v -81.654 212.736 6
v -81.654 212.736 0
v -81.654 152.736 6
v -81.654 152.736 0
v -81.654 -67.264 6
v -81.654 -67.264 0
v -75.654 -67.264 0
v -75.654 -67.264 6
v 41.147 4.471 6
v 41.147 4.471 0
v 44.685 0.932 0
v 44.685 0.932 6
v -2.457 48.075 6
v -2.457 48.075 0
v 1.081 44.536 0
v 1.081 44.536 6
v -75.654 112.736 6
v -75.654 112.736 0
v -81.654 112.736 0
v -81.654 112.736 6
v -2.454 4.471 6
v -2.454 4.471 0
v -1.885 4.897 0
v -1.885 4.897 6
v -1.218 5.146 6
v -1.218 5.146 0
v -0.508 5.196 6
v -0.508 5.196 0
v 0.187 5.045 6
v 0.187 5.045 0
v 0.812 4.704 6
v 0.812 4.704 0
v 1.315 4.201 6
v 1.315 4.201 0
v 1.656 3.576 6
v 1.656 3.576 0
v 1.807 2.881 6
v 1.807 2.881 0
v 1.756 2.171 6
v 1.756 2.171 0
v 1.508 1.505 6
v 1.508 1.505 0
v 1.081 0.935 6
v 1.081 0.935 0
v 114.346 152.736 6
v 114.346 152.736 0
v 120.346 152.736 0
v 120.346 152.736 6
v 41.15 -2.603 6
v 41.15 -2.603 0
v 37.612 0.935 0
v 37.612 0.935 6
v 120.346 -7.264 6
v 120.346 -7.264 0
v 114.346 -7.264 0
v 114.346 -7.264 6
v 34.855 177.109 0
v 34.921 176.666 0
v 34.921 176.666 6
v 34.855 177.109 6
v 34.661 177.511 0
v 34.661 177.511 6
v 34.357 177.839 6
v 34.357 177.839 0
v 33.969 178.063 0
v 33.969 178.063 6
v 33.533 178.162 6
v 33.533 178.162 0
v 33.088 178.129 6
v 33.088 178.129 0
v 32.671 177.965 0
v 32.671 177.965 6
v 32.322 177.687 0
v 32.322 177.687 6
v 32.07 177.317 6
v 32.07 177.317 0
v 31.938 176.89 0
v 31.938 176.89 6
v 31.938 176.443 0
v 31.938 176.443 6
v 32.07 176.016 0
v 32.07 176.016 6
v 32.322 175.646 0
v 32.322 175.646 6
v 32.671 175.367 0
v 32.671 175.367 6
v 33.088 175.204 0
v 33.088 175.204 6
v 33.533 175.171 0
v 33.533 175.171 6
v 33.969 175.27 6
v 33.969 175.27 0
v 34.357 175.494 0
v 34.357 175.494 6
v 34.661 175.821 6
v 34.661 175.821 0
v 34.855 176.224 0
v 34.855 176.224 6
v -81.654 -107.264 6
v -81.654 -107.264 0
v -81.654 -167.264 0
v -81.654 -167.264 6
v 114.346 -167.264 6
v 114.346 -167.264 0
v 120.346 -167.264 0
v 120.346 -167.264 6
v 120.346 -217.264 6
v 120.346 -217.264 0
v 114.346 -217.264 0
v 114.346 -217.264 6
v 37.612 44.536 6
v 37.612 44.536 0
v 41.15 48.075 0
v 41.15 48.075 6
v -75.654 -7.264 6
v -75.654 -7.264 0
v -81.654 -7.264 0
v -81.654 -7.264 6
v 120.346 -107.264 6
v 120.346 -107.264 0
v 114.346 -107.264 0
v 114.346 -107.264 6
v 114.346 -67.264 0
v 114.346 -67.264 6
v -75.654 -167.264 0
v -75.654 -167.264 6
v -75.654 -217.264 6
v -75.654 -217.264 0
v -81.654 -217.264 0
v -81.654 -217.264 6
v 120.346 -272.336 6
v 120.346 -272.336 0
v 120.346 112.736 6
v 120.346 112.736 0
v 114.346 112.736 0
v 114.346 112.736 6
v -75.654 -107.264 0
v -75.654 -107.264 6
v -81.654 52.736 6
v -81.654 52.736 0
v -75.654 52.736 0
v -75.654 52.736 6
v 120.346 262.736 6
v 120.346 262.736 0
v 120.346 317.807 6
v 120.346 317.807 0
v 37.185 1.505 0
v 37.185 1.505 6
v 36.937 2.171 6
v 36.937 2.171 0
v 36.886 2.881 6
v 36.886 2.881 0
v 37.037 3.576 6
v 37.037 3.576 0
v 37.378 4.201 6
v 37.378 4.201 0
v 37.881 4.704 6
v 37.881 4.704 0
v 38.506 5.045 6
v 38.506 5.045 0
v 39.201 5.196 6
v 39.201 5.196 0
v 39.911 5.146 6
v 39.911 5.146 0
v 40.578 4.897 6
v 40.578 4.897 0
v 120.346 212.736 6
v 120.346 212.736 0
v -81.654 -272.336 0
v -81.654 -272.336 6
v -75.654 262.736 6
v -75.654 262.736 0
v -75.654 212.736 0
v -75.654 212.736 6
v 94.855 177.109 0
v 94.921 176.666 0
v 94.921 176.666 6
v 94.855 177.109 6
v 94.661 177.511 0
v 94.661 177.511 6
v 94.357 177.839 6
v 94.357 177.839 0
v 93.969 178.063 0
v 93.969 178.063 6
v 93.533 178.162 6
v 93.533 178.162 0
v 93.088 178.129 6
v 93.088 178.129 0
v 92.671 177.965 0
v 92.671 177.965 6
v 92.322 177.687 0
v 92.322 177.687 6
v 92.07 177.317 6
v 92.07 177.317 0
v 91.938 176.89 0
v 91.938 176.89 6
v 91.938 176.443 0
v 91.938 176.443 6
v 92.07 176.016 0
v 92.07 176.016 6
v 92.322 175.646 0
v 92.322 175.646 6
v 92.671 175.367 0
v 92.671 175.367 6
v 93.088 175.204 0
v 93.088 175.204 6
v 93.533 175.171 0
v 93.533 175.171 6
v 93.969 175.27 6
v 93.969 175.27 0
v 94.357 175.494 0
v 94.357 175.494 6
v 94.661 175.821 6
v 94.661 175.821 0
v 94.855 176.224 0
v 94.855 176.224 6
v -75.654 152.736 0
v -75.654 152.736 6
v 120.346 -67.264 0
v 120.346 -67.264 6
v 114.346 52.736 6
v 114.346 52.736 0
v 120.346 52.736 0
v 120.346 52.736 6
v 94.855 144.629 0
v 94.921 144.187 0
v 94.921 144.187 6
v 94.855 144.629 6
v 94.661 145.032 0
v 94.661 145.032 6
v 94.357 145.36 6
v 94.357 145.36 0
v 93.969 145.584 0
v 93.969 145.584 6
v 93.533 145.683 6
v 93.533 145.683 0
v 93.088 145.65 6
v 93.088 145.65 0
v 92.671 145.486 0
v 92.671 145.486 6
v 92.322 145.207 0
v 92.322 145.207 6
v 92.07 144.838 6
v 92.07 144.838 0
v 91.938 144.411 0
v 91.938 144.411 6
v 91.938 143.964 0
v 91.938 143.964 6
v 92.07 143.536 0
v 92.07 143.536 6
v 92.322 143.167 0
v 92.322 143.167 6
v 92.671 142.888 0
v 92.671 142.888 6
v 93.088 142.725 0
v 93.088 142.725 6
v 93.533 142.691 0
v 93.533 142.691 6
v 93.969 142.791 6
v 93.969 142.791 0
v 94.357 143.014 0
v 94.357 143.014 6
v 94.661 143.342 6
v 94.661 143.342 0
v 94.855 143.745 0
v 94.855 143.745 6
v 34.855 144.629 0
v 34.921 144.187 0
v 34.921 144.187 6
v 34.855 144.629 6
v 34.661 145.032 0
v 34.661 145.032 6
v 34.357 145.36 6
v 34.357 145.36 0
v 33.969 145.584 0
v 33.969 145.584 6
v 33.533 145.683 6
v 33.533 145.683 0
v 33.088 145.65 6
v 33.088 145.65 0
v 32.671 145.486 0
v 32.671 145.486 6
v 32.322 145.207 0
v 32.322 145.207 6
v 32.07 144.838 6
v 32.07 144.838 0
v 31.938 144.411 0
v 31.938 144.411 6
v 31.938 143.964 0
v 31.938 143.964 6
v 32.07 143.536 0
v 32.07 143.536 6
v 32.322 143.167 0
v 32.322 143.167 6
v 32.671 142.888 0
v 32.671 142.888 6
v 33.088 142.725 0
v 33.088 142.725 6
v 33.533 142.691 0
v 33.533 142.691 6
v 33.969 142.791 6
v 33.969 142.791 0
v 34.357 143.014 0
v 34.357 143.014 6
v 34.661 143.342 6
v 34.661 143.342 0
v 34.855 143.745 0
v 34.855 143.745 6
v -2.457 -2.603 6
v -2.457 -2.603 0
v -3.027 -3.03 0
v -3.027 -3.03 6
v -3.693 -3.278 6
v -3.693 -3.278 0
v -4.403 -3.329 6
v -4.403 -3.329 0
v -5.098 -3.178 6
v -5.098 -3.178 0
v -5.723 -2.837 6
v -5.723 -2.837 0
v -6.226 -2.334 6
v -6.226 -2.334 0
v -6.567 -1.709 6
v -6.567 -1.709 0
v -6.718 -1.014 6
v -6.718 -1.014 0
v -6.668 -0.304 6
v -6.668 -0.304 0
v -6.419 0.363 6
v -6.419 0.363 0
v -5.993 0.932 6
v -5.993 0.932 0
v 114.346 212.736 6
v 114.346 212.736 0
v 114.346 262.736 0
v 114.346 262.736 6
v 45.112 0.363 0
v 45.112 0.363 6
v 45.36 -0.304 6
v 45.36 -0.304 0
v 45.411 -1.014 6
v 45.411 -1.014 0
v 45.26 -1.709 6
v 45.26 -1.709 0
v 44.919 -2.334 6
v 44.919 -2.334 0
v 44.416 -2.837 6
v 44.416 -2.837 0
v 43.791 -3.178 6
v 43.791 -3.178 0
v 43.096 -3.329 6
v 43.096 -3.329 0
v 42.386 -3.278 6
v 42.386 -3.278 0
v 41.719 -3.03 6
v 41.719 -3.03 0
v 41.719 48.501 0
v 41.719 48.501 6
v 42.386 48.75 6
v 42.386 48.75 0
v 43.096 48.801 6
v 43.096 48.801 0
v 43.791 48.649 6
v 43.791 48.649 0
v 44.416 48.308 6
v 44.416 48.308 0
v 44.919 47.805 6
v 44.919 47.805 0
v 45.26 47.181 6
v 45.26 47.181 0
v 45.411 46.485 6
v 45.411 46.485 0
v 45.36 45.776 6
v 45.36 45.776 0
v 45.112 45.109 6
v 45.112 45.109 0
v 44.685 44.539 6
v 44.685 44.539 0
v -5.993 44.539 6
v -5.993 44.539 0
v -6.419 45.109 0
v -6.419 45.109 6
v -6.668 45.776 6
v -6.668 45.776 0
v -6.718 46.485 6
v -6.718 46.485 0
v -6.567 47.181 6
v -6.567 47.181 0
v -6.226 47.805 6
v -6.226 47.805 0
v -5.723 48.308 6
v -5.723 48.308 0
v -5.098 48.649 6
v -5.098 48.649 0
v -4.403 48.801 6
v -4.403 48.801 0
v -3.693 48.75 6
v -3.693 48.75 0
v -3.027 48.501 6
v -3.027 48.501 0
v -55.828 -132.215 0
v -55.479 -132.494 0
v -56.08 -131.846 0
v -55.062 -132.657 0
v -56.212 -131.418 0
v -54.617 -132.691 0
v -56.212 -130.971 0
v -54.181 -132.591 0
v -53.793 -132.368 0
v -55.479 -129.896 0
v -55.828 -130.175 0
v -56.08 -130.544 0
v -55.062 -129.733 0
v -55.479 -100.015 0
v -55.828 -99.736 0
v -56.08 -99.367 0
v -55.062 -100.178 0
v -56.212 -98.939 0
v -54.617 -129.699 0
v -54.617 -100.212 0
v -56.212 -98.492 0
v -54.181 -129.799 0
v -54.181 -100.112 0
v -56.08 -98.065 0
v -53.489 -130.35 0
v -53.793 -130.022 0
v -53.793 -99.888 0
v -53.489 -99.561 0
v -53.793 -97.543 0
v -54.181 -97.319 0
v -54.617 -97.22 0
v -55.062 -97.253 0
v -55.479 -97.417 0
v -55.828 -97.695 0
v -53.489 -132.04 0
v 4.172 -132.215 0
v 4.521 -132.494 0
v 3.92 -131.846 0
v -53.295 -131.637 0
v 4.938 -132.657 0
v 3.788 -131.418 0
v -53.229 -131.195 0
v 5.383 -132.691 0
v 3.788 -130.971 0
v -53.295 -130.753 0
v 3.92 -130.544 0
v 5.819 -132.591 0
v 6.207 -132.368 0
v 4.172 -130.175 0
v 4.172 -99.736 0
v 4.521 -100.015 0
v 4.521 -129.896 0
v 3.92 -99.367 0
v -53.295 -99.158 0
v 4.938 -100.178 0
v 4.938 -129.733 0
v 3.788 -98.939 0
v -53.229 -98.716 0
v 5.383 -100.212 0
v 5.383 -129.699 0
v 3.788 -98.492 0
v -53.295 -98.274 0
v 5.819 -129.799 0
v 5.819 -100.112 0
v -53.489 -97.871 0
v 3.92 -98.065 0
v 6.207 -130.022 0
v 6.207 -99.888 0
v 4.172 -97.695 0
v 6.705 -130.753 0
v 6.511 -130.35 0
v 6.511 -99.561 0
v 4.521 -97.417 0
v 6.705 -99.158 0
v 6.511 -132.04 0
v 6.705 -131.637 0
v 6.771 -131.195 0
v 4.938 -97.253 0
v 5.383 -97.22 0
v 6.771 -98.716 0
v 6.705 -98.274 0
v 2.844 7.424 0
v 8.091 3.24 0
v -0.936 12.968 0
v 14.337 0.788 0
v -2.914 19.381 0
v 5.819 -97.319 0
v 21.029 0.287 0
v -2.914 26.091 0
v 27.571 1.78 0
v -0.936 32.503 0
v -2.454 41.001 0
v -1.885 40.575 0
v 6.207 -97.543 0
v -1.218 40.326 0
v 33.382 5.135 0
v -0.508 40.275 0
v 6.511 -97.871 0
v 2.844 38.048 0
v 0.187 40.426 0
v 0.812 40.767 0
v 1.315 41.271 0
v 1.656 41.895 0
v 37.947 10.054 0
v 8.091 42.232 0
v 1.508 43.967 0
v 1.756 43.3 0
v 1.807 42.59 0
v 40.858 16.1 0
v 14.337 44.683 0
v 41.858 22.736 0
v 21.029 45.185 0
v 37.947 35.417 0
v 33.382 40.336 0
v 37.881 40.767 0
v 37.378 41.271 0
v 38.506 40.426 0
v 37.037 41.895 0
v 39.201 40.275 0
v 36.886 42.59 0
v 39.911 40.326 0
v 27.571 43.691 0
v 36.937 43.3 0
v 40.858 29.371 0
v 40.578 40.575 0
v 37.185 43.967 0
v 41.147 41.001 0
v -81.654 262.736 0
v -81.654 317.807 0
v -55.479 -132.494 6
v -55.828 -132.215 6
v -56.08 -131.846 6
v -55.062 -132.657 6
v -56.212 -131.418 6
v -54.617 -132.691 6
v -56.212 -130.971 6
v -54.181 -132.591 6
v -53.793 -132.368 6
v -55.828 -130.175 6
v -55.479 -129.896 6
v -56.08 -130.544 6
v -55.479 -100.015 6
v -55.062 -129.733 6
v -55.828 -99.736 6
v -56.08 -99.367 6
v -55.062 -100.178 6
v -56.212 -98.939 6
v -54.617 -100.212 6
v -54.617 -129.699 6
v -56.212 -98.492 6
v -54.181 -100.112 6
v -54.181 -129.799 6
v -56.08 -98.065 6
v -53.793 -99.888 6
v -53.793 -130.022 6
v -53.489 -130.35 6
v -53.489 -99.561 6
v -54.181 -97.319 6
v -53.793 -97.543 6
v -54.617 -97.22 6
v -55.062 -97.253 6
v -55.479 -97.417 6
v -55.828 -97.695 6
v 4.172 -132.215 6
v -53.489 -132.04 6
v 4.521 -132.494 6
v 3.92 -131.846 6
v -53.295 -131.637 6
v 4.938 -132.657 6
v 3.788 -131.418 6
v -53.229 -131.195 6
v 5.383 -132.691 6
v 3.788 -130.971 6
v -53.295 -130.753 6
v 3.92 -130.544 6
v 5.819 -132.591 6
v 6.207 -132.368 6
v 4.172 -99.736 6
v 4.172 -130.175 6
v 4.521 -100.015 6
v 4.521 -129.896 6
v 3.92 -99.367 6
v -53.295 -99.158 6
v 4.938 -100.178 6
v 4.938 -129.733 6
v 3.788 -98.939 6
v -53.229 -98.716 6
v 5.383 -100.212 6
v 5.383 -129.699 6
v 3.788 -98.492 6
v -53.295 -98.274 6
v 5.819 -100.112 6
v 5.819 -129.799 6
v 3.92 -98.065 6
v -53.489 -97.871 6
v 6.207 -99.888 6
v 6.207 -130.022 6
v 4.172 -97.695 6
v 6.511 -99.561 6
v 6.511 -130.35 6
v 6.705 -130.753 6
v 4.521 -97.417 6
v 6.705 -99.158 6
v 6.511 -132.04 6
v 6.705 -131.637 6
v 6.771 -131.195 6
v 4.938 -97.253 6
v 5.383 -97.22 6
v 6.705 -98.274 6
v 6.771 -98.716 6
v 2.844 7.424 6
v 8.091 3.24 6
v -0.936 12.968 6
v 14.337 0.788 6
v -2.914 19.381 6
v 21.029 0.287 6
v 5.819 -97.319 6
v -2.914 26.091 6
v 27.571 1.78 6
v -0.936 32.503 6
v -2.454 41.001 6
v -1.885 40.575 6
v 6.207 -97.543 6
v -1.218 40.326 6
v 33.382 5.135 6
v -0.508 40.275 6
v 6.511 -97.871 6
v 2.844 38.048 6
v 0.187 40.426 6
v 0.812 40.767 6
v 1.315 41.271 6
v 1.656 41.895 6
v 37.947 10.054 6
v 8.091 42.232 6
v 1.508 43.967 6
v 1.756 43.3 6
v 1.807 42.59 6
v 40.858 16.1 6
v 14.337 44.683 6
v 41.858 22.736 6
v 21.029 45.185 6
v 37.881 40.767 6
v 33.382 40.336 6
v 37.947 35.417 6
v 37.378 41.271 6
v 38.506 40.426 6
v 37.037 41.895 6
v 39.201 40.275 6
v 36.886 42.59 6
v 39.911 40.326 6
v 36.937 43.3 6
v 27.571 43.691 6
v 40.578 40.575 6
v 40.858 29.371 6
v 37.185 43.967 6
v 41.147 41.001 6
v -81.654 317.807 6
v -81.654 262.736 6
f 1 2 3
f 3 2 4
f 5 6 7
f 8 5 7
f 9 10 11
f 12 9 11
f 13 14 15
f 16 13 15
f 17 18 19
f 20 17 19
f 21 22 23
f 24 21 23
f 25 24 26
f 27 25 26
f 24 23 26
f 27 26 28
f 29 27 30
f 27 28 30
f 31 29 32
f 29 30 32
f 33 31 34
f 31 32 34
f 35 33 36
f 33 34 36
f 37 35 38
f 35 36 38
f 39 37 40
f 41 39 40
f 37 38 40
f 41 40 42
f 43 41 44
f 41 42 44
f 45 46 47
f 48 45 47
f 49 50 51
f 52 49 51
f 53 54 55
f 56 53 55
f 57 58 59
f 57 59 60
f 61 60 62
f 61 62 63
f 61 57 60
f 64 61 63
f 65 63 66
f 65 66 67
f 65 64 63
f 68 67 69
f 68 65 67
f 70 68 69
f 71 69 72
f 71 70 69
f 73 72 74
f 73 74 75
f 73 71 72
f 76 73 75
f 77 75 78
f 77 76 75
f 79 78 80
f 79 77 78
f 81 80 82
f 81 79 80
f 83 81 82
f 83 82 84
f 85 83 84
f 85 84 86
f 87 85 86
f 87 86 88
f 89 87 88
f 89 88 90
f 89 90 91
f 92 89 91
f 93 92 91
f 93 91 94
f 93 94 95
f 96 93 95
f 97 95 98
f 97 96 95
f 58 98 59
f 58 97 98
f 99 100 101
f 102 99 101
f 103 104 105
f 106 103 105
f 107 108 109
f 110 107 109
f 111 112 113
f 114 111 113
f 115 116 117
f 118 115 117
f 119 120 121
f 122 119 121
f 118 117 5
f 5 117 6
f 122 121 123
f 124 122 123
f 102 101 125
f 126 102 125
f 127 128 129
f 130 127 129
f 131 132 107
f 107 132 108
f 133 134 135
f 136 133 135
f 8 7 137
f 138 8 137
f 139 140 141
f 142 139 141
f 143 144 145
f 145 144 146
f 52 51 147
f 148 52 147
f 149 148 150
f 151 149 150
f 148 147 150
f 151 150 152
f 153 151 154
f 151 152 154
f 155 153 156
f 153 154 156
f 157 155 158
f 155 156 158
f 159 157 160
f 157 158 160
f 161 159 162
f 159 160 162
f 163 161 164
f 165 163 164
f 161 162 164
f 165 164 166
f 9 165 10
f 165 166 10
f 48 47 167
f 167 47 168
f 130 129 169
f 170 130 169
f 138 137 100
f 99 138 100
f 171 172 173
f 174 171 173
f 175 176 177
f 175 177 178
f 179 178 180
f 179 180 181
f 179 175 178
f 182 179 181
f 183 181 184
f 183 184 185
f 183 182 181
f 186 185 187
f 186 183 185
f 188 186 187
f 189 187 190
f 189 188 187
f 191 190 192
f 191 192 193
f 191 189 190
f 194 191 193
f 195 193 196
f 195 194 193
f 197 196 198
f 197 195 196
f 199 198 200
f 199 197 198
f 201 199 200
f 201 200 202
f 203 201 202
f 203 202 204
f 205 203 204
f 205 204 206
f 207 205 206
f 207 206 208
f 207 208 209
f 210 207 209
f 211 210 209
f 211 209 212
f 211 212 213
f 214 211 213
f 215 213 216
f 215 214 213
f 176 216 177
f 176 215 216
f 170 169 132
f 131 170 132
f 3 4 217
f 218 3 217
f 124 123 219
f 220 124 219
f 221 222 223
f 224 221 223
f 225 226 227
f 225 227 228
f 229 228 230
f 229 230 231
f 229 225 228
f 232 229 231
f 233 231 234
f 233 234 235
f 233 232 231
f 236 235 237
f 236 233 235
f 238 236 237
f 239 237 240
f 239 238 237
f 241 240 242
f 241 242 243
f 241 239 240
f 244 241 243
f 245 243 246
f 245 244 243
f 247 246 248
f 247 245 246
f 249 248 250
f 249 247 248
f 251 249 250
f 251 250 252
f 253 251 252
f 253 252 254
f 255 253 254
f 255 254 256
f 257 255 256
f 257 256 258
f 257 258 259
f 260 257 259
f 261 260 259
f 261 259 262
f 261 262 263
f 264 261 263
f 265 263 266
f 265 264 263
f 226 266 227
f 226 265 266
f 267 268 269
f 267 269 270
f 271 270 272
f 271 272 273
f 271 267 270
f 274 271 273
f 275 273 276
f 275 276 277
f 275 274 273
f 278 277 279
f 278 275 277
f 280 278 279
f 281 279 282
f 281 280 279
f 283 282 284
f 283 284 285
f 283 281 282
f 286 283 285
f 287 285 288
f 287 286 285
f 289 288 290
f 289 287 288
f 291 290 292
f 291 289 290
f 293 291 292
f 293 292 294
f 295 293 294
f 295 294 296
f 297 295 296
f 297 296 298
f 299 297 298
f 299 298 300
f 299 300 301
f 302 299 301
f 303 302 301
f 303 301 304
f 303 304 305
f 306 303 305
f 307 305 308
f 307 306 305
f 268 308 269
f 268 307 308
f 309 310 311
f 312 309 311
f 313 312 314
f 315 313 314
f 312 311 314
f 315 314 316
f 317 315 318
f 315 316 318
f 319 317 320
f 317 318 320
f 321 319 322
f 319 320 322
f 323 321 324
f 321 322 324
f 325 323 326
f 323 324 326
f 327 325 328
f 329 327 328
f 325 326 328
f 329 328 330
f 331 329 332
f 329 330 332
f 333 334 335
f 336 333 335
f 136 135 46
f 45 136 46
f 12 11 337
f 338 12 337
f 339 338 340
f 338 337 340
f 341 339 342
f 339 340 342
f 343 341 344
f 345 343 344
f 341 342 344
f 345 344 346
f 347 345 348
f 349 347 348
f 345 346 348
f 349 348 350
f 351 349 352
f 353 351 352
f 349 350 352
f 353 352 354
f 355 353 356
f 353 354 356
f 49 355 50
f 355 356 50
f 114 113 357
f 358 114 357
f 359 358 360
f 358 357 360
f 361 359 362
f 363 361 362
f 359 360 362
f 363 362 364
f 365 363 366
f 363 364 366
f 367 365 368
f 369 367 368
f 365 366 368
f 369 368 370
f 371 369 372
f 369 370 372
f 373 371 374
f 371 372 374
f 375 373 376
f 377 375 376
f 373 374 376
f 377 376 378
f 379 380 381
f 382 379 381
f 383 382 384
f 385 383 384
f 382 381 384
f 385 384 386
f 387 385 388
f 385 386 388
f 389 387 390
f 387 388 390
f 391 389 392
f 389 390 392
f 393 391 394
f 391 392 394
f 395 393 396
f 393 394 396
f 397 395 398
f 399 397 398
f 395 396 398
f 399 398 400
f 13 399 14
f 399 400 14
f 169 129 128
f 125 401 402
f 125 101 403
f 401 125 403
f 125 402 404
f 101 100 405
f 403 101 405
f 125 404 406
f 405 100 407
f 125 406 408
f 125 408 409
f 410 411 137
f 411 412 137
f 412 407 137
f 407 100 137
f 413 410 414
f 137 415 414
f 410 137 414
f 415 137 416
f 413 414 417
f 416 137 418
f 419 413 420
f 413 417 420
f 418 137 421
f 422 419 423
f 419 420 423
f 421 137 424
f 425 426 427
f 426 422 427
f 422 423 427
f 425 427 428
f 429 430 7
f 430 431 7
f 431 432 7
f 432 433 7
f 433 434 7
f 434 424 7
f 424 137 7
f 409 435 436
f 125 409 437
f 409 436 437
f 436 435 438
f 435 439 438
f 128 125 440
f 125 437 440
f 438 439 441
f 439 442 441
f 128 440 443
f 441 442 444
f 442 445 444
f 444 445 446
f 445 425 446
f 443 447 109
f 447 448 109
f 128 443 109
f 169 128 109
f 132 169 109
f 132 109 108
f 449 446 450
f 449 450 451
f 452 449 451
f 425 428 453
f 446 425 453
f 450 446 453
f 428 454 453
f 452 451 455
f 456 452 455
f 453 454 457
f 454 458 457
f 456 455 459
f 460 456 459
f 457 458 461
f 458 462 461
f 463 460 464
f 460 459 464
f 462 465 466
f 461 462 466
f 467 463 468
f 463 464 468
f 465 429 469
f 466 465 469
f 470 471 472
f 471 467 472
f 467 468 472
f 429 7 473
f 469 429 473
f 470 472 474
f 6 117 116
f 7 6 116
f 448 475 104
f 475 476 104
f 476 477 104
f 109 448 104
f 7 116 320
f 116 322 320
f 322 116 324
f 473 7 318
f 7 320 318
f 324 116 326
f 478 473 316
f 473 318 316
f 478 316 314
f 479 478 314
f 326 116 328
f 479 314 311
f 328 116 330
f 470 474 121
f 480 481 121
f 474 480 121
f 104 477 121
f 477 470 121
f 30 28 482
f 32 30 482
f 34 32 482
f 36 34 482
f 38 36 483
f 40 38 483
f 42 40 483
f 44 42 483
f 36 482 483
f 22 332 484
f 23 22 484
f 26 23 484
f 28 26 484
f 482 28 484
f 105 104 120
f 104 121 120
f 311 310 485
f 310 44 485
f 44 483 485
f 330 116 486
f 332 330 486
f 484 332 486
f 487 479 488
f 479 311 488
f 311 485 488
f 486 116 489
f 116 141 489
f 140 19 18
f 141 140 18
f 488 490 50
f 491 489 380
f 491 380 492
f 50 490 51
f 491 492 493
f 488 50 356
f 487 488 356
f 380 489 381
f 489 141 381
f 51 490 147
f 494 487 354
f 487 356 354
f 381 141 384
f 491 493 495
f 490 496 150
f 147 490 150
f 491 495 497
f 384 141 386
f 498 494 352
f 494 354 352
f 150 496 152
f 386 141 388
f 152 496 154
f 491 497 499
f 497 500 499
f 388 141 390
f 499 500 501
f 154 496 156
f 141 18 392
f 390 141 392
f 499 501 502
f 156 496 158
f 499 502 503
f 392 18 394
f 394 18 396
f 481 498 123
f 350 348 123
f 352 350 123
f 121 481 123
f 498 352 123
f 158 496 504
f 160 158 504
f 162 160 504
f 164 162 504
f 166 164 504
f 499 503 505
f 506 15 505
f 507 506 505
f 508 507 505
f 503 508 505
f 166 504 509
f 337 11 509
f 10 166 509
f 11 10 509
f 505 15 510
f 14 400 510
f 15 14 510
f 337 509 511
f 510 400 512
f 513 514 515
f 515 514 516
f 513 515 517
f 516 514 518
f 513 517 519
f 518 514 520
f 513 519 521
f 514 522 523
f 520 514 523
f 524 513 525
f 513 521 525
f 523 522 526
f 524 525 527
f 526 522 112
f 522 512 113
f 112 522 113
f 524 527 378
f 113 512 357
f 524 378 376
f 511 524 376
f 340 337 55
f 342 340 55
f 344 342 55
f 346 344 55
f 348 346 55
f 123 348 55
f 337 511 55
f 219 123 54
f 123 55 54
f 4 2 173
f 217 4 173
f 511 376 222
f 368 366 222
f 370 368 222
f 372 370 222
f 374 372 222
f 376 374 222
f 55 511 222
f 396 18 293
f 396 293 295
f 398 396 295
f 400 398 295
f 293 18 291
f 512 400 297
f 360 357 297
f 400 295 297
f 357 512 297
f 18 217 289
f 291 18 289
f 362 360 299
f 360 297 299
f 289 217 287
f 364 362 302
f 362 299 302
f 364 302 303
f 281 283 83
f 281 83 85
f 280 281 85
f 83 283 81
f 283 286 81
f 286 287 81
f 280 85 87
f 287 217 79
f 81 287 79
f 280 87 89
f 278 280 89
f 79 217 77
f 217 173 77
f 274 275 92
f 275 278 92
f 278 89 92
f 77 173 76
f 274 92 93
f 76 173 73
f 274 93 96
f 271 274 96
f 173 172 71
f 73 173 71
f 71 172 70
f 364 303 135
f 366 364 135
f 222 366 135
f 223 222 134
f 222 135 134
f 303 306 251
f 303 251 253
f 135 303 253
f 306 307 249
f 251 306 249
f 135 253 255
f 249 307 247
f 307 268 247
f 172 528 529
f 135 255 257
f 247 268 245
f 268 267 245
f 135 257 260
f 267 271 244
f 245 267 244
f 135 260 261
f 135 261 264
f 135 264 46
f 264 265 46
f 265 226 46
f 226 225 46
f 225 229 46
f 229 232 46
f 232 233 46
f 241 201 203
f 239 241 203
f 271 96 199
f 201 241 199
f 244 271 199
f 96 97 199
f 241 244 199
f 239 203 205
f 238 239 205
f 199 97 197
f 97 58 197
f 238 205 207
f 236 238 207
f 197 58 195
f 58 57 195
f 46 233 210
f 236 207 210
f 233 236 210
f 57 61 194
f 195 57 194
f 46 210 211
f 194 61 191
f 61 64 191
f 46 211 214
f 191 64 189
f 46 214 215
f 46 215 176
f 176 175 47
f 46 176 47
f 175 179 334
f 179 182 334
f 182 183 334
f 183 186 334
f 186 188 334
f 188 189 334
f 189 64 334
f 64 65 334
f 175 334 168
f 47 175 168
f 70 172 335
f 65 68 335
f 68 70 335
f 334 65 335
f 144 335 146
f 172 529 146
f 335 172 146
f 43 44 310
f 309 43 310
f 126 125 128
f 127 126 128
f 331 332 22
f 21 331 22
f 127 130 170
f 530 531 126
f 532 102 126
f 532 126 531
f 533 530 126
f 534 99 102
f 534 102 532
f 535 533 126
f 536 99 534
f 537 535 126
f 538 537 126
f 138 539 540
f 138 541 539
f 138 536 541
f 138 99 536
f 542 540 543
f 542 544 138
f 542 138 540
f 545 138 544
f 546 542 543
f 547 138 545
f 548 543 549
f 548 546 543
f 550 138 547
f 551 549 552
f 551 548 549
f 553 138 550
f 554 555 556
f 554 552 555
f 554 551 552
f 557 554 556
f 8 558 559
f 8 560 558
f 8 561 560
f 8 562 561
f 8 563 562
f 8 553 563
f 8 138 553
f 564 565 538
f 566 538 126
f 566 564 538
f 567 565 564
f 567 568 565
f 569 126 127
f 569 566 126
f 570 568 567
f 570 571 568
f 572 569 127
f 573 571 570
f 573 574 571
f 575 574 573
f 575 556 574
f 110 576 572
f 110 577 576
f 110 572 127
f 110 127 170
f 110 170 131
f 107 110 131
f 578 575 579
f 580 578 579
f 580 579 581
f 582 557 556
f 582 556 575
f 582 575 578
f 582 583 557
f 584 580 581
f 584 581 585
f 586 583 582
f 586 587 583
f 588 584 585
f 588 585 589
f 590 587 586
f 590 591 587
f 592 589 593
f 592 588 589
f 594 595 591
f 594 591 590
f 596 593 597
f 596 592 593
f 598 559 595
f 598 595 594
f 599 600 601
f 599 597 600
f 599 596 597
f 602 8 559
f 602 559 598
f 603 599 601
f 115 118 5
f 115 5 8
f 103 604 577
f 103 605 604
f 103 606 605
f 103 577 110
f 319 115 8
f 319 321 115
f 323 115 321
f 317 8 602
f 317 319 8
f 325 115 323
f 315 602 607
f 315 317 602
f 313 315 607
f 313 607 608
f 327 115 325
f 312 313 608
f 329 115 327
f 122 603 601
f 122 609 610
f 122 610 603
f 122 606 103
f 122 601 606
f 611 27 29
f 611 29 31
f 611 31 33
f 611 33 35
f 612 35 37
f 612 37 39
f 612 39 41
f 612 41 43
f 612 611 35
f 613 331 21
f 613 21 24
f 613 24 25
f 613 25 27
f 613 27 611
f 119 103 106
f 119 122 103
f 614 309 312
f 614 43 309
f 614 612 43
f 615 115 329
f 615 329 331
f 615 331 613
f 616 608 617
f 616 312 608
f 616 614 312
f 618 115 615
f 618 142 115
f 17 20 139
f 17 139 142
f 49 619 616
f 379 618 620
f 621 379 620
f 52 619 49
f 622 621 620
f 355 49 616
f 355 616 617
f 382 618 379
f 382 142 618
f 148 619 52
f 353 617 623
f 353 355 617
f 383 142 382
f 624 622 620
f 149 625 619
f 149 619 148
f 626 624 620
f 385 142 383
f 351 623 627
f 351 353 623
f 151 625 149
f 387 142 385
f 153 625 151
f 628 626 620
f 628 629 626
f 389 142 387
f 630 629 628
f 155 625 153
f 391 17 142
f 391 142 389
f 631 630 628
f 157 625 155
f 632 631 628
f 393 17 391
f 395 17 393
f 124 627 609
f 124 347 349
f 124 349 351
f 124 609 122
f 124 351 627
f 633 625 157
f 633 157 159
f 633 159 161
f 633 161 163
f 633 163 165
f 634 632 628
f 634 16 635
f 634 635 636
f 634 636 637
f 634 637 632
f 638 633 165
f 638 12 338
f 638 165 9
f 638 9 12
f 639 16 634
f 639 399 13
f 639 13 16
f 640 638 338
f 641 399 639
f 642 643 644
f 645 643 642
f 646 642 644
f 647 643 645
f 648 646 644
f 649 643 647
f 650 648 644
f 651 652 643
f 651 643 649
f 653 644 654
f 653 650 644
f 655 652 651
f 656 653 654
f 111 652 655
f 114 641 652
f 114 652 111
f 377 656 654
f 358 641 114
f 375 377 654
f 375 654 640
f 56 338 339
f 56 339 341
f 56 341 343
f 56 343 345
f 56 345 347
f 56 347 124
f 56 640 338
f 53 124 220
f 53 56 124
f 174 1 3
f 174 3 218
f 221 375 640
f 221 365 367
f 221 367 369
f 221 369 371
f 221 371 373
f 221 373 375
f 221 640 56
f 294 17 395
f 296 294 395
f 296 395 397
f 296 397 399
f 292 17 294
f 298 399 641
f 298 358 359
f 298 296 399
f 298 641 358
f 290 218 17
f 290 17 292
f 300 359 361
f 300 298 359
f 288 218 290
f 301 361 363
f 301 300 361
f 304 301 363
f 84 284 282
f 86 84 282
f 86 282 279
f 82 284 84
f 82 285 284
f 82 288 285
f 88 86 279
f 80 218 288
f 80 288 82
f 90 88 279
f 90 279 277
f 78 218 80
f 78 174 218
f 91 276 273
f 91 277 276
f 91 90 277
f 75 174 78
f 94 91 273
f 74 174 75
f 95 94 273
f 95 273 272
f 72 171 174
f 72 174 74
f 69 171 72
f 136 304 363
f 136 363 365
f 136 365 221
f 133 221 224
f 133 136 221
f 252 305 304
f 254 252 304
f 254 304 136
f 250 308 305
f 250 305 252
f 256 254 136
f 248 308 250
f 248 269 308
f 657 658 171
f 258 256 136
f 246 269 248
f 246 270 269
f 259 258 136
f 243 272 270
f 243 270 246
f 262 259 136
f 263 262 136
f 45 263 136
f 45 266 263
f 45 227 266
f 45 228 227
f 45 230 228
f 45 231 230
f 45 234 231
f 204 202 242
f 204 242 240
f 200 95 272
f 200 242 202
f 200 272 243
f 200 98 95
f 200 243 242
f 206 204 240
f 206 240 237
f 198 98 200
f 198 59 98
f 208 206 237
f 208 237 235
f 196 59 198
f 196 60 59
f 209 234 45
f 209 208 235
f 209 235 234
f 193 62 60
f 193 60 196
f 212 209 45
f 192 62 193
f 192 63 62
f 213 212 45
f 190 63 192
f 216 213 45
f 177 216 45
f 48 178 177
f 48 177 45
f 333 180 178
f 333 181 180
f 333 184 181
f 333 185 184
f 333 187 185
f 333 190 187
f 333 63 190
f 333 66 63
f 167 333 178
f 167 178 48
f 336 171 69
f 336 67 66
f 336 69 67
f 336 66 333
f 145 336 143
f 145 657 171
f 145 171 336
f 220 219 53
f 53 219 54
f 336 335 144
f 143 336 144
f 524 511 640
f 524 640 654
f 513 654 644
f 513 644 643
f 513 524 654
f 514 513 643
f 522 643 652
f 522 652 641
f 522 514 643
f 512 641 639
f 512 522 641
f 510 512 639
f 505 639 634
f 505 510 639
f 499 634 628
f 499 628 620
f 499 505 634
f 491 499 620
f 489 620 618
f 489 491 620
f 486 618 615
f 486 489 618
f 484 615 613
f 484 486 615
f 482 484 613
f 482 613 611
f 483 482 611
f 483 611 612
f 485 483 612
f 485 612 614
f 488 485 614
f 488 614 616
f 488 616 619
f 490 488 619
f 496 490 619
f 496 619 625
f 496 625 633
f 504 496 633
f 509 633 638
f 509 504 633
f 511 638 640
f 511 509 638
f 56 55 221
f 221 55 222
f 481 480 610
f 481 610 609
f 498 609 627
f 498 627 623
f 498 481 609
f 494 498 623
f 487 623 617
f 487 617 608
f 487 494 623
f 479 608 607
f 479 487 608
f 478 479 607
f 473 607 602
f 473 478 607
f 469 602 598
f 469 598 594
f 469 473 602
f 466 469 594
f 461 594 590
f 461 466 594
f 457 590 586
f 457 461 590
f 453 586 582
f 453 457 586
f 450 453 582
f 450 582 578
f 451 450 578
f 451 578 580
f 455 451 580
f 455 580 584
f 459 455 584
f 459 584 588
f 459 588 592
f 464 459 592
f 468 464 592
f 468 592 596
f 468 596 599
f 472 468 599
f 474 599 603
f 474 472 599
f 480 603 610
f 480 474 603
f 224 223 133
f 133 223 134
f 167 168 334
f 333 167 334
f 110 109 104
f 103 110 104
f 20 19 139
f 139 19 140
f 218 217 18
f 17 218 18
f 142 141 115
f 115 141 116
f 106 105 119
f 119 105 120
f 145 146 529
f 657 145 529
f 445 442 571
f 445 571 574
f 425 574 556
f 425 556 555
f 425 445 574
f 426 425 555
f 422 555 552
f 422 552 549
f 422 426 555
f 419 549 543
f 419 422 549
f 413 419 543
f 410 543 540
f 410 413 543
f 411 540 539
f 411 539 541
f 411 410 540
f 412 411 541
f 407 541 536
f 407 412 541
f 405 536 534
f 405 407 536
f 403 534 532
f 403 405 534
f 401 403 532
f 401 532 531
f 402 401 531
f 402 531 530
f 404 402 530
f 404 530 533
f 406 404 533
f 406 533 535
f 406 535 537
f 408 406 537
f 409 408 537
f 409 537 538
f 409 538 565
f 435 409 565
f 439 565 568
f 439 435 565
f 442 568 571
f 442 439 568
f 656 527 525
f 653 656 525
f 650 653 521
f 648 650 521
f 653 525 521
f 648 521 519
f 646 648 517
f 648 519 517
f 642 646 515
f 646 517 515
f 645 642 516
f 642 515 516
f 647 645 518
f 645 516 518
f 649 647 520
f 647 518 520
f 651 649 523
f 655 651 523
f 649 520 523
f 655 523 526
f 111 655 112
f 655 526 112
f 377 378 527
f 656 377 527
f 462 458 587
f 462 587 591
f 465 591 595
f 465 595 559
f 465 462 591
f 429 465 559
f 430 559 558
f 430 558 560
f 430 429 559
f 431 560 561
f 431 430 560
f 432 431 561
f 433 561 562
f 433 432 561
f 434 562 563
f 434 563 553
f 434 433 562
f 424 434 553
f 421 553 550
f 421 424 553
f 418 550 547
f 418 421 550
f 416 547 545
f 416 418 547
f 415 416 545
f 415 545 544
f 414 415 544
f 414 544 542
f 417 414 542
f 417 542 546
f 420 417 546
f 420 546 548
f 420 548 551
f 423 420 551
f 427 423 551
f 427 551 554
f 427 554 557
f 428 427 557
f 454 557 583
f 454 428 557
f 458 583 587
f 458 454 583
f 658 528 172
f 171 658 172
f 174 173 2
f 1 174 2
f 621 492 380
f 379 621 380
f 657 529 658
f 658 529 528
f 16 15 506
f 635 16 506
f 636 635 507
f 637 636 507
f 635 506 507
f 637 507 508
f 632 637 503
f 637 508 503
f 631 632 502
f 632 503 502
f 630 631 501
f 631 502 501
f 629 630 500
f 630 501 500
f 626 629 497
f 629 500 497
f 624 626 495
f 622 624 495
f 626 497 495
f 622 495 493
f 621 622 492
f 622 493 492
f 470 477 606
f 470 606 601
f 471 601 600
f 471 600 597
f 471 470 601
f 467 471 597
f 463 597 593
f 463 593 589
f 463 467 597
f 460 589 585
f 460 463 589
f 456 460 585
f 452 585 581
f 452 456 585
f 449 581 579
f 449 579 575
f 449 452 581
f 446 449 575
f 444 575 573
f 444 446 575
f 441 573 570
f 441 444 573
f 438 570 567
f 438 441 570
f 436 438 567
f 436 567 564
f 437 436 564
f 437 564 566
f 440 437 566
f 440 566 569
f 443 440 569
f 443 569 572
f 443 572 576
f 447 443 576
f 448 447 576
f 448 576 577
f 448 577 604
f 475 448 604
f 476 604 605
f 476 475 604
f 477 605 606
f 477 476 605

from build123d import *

# Parameters (mm, degrees)
SKETCH1_R           = 1.5
SKETCH1_R_2         = 22.511799613
BOSS_EXTRUDE1_DEPTH = 6


with BuildPart() as part:
    # Sketch1 → Boss-Extrude1 (new body)
    with BuildSketch(Plane.XY):
        Polygon((114.346400169, -107.26425955), (114.346400169, -67.26425955), (120.346400169, -67.26425955), (120.346400169, -7.26425955), (114.346400169, -7.26425955), (114.346400169, 52.73574045), (120.346400169, 52.73574045), (120.346400169, 112.73574045), (114.346400169, 112.73574045), (114.346400169, 152.73574045), (120.346400169, 152.73574045), (120.346400169, 212.73574045), (114.346400169, 212.73574045), (114.346400169, 262.73574045), (120.346400169, 262.73574045), (120.346400169, 317.807433635), (-81.653599831, 317.807433635), (-81.653599831, 262.73574045), (-75.653599831, 262.73574045), (-75.653599831, 212.73574045), (-81.653599831, 212.73574045), (-81.653599831, 152.73574045), (-75.653599831, 152.73574045), (-75.653599831, 112.73574045), (-81.653599831, 112.73574045), (-81.653599831, 52.73574045), (-75.653599831, 52.73574045), (-75.653599831, -7.26425955), (-81.653599831, -7.26425955), (-81.653599831, -67.26425955), (-75.653599831, -67.26425955), (-75.653599831, -107.26425955), (-81.653599831, -107.26425955), (-81.653599831, -167.26425955), (-75.653599831, -167.26425955), (-75.653599831, -217.26425955), (-81.653599831, -217.26425955), (-81.653599831, -272.335952735), (120.346400169, -272.335952735), (120.346400169, -217.26425955), (114.346400169, -217.26425955), (114.346400169, -167.26425955), (120.346400169, -167.26425955), (120.346400169, -107.26425955), align=None)
        with Locations((93.421400169, 144.187215683)):
            Circle(SKETCH1_R, mode=Mode.SUBTRACT)
        with Locations((93.421400169, 176.66641252)):
            Circle(SKETCH1_R, mode=Mode.SUBTRACT)
        with Locations((33.421400169, 144.187215683)):
            Circle(SKETCH1_R, mode=Mode.SUBTRACT)
        with Locations((-54.728599831, -131.19493162)):
            Circle(SKETCH1_R, mode=Mode.SUBTRACT)
        with Locations((33.421400169, 176.66641252)):
            Circle(SKETCH1_R, mode=Mode.SUBTRACT)
        with Locations((-54.728599831, -98.715734783)):
            Circle(SKETCH1_R, mode=Mode.SUBTRACT)
        with Locations((5.271400169, -98.715734783)):
            Circle(SKETCH1_R, mode=Mode.SUBTRACT)
        with Locations((19.346400169, 22.73574045)):
            Circle(SKETCH1_R_2, mode=Mode.SUBTRACT)
        with Locations((5.271400169, -131.19493162)):
            Circle(SKETCH1_R, mode=Mode.SUBTRACT)
        with BuildLine():
            Line((41.149833216, -2.603226503), (37.611612305, 0.934994409))
            ThreePointArc((37.611612305, 0.934994409), (37.611612305, 4.470528314), (41.147146211, 4.470528314))
            Line((41.147146211, 4.470528314), (44.685367122, 0.932307403))
            ThreePointArc((44.685367122, 0.932307403), (44.685367122, -2.603226503), (41.149833216, -2.603226503))
        make_face(mode=Mode.SUBTRACT)
        with BuildLine():
            Line((-5.992566784, 0.932307403), (-2.454345872, 4.470528314))
            ThreePointArc((-2.454345872, 4.470528314), (1.081188034, 4.470528314), (1.081188034, 0.934994409))
            Line((1.081188034, 0.934994409), (-2.457032878, -2.603226503))
            ThreePointArc((-2.457032878, -2.603226503), (-5.992566784, -2.603226503), (-5.992566784, 0.932307403))
        make_face(mode=Mode.SUBTRACT)
        with BuildLine():
            Line((-2.457032878, 48.074707403), (1.081188034, 44.536486491))
            ThreePointArc((1.081188034, 44.536486491), (1.081188034, 41.000952585), (-2.454345872, 41.000952585))
            Line((-2.454345872, 41.000952585), (-5.992566784, 44.539173497))
            ThreePointArc((-5.992566784, 44.539173497), (-5.992566784, 48.074707403), (-2.457032878, 48.074707403))
        make_face(mode=Mode.SUBTRACT)
        with BuildLine():
            Line((44.685367122, 44.539173497), (41.147146211, 41.000952585))
            ThreePointArc((41.147146211, 41.000952585), (37.611612305, 41.000952585), (37.611612305, 44.536486491))
            Line((37.611612305, 44.536486491), (41.149833216, 48.074707403))
            ThreePointArc((41.149833216, 48.074707403), (44.685367122, 48.074707403), (44.685367122, 44.539173497))
        make_face(mode=Mode.SUBTRACT)
    extrude(amount=BOSS_EXTRUDE1_DEPTH)


solid = part.part
